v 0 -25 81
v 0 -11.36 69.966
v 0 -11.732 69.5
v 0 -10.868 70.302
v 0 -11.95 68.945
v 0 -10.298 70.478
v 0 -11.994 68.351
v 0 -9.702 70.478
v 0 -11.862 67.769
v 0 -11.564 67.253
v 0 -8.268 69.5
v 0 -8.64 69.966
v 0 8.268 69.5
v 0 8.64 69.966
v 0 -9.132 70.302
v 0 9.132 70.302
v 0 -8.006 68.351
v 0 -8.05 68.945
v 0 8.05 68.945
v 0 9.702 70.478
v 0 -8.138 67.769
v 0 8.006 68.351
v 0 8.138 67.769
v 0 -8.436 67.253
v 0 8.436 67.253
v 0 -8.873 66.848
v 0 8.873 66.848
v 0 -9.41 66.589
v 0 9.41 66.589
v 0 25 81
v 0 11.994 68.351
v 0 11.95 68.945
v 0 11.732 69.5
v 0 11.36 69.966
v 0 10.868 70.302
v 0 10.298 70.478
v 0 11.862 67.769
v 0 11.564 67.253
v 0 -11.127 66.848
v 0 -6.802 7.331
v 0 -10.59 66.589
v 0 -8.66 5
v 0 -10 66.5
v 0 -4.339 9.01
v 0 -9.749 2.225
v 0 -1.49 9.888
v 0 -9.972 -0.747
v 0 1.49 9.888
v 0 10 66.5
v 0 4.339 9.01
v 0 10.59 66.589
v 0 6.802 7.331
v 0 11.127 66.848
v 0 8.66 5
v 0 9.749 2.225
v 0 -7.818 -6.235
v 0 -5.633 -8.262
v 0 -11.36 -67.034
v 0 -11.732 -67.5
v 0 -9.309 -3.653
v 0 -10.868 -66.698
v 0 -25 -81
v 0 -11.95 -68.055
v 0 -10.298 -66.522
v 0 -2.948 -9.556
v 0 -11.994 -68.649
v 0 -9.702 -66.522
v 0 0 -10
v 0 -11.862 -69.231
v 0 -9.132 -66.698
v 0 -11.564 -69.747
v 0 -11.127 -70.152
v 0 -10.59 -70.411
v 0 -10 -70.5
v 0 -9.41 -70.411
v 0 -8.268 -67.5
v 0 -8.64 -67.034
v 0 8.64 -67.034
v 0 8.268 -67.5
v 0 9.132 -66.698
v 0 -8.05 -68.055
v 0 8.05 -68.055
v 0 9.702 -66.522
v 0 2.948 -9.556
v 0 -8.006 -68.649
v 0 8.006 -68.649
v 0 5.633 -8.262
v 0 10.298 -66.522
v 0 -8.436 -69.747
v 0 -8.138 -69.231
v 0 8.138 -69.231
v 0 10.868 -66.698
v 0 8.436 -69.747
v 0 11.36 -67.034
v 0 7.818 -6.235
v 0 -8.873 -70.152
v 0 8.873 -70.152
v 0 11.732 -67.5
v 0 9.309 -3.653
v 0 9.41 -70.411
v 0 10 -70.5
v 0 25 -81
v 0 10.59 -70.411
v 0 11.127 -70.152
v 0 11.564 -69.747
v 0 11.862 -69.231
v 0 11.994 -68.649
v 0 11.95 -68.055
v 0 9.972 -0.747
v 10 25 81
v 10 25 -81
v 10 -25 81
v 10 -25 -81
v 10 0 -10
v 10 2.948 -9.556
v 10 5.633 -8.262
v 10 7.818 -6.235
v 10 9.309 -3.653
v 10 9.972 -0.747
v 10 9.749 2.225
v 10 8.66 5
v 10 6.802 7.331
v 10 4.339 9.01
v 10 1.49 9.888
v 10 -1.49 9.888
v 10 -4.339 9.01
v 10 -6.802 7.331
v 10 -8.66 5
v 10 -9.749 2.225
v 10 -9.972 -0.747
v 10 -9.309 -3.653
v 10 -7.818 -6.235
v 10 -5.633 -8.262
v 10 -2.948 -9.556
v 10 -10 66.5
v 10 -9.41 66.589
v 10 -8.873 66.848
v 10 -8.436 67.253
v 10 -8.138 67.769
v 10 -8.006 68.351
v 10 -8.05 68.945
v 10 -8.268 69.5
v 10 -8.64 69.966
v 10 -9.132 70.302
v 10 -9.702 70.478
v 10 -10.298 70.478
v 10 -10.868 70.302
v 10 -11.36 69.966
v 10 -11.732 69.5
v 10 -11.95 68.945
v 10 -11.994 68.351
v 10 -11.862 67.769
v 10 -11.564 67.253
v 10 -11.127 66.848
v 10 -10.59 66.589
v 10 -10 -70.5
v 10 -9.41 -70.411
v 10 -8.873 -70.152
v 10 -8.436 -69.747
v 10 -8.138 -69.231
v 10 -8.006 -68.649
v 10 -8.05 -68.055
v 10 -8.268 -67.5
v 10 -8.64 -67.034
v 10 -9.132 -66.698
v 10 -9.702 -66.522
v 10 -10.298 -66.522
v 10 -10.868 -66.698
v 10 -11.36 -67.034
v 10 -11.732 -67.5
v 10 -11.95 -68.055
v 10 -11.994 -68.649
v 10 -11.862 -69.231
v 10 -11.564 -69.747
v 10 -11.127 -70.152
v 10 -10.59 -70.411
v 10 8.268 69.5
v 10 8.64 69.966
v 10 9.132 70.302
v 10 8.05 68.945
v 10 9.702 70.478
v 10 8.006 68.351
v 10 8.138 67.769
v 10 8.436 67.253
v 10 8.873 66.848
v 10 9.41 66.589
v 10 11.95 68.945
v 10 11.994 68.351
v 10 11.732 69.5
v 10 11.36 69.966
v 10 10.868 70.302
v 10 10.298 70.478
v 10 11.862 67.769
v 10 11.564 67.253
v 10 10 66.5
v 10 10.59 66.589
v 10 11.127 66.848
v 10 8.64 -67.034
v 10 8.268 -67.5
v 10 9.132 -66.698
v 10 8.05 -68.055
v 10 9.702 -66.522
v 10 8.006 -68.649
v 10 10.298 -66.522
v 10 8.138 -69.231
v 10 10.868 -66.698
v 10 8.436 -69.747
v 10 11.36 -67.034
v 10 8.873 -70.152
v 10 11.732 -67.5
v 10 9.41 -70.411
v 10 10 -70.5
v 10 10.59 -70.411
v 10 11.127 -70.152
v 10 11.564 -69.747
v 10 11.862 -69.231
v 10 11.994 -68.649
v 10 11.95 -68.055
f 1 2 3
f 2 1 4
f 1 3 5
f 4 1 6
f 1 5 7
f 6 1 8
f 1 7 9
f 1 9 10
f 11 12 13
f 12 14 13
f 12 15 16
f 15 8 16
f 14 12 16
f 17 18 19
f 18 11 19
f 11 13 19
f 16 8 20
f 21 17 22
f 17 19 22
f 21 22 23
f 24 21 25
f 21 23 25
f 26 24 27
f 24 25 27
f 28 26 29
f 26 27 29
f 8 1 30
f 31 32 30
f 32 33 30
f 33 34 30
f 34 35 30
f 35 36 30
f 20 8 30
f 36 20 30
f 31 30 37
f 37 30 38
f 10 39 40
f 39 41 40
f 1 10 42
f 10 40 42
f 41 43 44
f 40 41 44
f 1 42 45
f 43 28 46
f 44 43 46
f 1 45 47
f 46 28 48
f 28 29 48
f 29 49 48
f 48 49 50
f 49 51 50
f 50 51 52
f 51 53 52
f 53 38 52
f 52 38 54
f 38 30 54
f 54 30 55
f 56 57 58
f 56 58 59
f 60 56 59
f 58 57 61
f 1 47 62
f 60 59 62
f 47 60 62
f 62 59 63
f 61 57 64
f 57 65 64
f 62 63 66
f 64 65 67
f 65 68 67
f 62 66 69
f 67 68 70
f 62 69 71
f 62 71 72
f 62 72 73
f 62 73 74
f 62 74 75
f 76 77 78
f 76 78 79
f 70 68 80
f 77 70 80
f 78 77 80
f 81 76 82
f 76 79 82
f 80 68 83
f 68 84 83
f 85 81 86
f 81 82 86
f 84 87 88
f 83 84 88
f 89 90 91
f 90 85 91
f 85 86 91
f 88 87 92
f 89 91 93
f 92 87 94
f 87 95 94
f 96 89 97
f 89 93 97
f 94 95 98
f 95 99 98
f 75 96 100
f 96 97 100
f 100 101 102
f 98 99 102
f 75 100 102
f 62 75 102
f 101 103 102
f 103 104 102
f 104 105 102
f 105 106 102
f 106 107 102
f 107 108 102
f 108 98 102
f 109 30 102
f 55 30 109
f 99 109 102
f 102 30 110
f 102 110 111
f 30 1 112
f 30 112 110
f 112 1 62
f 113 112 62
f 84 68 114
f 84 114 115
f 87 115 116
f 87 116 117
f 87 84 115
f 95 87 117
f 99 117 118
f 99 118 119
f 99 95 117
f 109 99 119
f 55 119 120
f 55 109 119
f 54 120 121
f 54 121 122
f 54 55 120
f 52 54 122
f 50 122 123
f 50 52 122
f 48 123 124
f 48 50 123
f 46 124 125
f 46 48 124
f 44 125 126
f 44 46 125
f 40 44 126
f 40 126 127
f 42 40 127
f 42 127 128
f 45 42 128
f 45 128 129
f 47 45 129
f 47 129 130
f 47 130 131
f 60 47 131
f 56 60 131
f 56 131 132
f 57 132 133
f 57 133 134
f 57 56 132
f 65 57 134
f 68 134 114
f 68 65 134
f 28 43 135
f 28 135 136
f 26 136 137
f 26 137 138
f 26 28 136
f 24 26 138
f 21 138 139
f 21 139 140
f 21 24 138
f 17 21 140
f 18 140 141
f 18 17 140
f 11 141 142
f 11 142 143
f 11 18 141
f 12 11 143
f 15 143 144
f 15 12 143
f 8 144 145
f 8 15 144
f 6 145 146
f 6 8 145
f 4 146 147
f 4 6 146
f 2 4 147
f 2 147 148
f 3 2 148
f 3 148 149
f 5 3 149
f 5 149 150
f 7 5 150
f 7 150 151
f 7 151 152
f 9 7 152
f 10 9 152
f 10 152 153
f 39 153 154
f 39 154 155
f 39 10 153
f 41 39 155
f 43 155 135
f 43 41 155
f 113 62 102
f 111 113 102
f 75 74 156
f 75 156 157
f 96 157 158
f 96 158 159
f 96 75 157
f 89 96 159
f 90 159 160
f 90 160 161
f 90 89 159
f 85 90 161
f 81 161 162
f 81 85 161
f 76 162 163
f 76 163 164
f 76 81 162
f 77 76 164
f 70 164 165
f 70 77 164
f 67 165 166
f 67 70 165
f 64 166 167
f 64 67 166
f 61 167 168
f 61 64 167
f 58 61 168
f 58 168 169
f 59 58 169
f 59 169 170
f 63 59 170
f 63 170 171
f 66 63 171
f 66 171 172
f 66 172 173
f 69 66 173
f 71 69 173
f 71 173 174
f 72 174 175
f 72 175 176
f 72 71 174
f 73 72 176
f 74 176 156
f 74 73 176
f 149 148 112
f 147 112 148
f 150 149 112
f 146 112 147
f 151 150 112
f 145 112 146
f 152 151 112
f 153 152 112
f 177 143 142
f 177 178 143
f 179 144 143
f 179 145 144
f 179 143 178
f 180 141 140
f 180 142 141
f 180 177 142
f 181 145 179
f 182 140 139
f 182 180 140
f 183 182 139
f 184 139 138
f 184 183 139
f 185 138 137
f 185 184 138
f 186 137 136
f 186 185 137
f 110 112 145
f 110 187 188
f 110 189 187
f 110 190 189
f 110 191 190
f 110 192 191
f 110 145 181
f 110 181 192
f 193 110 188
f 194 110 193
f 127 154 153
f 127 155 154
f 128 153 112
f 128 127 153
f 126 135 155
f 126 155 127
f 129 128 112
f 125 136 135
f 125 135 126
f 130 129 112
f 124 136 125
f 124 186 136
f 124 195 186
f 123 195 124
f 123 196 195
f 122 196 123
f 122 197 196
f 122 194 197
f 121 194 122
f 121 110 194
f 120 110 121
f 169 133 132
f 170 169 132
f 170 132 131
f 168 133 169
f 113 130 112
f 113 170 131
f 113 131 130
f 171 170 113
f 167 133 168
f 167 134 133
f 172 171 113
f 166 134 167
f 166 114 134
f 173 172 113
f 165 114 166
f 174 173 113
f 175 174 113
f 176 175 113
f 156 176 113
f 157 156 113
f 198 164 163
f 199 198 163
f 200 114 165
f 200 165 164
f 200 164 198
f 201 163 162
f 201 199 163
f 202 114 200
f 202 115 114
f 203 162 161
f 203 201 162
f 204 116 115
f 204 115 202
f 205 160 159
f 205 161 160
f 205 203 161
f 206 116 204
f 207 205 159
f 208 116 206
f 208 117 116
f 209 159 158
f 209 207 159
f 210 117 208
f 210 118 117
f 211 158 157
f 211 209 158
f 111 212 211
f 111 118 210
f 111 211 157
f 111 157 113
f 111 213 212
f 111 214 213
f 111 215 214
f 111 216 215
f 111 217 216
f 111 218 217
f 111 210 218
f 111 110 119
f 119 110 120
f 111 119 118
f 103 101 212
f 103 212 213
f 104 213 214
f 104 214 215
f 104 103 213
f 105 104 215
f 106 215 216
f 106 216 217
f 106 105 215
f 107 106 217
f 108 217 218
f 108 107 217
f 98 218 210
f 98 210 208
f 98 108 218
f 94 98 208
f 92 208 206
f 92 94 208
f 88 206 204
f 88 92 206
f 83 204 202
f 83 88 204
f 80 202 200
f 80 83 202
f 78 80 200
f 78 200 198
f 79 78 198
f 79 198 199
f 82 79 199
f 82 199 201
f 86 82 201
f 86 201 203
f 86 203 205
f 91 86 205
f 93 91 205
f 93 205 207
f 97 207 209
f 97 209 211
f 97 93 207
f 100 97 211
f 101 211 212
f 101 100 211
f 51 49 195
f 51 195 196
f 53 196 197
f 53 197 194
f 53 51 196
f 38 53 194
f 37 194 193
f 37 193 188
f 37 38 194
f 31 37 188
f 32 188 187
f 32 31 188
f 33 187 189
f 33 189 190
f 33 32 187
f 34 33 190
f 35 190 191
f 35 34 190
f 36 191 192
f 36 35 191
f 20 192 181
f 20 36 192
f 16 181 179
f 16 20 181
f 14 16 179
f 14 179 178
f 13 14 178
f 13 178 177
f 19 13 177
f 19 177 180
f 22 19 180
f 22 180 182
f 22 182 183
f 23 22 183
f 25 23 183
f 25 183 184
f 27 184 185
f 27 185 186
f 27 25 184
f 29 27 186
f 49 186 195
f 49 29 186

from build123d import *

# Parameters (mm, degrees)
SKETCH1_W           = 162
SKETCH1_H           = 50
SKETCH1_R           = 10
SKETCH1_R_2         = 2
BOSS_EXTRUDE1_DEPTH = 10


with BuildPart() as part:
    # Sketch1 → Boss-Extrude1 (new body)
    with BuildSketch(Plane(origin=(0, 0, 0), x_dir=(0, 0, -1), z_dir=(1, 0, 0))):
        Rectangle(SKETCH1_W, SKETCH1_H)
        Circle(SKETCH1_R, mode=Mode.SUBTRACT)
        with Locations((-68.5, 10)):
            Circle(SKETCH1_R_2, mode=Mode.SUBTRACT)
        with Locations((-68.5, -10)):
            Circle(SKETCH1_R_2, mode=Mode.SUBTRACT)
        with Locations((68.5, 10)):
            Circle(SKETCH1_R_2, mode=Mode.SUBTRACT)
        with Locations((68.5, -10)):
            Circle(SKETCH1_R_2, mode=Mode.SUBTRACT)
    extrude(amount=BOSS_EXTRUDE1_DEPTH)


solid = part.part
